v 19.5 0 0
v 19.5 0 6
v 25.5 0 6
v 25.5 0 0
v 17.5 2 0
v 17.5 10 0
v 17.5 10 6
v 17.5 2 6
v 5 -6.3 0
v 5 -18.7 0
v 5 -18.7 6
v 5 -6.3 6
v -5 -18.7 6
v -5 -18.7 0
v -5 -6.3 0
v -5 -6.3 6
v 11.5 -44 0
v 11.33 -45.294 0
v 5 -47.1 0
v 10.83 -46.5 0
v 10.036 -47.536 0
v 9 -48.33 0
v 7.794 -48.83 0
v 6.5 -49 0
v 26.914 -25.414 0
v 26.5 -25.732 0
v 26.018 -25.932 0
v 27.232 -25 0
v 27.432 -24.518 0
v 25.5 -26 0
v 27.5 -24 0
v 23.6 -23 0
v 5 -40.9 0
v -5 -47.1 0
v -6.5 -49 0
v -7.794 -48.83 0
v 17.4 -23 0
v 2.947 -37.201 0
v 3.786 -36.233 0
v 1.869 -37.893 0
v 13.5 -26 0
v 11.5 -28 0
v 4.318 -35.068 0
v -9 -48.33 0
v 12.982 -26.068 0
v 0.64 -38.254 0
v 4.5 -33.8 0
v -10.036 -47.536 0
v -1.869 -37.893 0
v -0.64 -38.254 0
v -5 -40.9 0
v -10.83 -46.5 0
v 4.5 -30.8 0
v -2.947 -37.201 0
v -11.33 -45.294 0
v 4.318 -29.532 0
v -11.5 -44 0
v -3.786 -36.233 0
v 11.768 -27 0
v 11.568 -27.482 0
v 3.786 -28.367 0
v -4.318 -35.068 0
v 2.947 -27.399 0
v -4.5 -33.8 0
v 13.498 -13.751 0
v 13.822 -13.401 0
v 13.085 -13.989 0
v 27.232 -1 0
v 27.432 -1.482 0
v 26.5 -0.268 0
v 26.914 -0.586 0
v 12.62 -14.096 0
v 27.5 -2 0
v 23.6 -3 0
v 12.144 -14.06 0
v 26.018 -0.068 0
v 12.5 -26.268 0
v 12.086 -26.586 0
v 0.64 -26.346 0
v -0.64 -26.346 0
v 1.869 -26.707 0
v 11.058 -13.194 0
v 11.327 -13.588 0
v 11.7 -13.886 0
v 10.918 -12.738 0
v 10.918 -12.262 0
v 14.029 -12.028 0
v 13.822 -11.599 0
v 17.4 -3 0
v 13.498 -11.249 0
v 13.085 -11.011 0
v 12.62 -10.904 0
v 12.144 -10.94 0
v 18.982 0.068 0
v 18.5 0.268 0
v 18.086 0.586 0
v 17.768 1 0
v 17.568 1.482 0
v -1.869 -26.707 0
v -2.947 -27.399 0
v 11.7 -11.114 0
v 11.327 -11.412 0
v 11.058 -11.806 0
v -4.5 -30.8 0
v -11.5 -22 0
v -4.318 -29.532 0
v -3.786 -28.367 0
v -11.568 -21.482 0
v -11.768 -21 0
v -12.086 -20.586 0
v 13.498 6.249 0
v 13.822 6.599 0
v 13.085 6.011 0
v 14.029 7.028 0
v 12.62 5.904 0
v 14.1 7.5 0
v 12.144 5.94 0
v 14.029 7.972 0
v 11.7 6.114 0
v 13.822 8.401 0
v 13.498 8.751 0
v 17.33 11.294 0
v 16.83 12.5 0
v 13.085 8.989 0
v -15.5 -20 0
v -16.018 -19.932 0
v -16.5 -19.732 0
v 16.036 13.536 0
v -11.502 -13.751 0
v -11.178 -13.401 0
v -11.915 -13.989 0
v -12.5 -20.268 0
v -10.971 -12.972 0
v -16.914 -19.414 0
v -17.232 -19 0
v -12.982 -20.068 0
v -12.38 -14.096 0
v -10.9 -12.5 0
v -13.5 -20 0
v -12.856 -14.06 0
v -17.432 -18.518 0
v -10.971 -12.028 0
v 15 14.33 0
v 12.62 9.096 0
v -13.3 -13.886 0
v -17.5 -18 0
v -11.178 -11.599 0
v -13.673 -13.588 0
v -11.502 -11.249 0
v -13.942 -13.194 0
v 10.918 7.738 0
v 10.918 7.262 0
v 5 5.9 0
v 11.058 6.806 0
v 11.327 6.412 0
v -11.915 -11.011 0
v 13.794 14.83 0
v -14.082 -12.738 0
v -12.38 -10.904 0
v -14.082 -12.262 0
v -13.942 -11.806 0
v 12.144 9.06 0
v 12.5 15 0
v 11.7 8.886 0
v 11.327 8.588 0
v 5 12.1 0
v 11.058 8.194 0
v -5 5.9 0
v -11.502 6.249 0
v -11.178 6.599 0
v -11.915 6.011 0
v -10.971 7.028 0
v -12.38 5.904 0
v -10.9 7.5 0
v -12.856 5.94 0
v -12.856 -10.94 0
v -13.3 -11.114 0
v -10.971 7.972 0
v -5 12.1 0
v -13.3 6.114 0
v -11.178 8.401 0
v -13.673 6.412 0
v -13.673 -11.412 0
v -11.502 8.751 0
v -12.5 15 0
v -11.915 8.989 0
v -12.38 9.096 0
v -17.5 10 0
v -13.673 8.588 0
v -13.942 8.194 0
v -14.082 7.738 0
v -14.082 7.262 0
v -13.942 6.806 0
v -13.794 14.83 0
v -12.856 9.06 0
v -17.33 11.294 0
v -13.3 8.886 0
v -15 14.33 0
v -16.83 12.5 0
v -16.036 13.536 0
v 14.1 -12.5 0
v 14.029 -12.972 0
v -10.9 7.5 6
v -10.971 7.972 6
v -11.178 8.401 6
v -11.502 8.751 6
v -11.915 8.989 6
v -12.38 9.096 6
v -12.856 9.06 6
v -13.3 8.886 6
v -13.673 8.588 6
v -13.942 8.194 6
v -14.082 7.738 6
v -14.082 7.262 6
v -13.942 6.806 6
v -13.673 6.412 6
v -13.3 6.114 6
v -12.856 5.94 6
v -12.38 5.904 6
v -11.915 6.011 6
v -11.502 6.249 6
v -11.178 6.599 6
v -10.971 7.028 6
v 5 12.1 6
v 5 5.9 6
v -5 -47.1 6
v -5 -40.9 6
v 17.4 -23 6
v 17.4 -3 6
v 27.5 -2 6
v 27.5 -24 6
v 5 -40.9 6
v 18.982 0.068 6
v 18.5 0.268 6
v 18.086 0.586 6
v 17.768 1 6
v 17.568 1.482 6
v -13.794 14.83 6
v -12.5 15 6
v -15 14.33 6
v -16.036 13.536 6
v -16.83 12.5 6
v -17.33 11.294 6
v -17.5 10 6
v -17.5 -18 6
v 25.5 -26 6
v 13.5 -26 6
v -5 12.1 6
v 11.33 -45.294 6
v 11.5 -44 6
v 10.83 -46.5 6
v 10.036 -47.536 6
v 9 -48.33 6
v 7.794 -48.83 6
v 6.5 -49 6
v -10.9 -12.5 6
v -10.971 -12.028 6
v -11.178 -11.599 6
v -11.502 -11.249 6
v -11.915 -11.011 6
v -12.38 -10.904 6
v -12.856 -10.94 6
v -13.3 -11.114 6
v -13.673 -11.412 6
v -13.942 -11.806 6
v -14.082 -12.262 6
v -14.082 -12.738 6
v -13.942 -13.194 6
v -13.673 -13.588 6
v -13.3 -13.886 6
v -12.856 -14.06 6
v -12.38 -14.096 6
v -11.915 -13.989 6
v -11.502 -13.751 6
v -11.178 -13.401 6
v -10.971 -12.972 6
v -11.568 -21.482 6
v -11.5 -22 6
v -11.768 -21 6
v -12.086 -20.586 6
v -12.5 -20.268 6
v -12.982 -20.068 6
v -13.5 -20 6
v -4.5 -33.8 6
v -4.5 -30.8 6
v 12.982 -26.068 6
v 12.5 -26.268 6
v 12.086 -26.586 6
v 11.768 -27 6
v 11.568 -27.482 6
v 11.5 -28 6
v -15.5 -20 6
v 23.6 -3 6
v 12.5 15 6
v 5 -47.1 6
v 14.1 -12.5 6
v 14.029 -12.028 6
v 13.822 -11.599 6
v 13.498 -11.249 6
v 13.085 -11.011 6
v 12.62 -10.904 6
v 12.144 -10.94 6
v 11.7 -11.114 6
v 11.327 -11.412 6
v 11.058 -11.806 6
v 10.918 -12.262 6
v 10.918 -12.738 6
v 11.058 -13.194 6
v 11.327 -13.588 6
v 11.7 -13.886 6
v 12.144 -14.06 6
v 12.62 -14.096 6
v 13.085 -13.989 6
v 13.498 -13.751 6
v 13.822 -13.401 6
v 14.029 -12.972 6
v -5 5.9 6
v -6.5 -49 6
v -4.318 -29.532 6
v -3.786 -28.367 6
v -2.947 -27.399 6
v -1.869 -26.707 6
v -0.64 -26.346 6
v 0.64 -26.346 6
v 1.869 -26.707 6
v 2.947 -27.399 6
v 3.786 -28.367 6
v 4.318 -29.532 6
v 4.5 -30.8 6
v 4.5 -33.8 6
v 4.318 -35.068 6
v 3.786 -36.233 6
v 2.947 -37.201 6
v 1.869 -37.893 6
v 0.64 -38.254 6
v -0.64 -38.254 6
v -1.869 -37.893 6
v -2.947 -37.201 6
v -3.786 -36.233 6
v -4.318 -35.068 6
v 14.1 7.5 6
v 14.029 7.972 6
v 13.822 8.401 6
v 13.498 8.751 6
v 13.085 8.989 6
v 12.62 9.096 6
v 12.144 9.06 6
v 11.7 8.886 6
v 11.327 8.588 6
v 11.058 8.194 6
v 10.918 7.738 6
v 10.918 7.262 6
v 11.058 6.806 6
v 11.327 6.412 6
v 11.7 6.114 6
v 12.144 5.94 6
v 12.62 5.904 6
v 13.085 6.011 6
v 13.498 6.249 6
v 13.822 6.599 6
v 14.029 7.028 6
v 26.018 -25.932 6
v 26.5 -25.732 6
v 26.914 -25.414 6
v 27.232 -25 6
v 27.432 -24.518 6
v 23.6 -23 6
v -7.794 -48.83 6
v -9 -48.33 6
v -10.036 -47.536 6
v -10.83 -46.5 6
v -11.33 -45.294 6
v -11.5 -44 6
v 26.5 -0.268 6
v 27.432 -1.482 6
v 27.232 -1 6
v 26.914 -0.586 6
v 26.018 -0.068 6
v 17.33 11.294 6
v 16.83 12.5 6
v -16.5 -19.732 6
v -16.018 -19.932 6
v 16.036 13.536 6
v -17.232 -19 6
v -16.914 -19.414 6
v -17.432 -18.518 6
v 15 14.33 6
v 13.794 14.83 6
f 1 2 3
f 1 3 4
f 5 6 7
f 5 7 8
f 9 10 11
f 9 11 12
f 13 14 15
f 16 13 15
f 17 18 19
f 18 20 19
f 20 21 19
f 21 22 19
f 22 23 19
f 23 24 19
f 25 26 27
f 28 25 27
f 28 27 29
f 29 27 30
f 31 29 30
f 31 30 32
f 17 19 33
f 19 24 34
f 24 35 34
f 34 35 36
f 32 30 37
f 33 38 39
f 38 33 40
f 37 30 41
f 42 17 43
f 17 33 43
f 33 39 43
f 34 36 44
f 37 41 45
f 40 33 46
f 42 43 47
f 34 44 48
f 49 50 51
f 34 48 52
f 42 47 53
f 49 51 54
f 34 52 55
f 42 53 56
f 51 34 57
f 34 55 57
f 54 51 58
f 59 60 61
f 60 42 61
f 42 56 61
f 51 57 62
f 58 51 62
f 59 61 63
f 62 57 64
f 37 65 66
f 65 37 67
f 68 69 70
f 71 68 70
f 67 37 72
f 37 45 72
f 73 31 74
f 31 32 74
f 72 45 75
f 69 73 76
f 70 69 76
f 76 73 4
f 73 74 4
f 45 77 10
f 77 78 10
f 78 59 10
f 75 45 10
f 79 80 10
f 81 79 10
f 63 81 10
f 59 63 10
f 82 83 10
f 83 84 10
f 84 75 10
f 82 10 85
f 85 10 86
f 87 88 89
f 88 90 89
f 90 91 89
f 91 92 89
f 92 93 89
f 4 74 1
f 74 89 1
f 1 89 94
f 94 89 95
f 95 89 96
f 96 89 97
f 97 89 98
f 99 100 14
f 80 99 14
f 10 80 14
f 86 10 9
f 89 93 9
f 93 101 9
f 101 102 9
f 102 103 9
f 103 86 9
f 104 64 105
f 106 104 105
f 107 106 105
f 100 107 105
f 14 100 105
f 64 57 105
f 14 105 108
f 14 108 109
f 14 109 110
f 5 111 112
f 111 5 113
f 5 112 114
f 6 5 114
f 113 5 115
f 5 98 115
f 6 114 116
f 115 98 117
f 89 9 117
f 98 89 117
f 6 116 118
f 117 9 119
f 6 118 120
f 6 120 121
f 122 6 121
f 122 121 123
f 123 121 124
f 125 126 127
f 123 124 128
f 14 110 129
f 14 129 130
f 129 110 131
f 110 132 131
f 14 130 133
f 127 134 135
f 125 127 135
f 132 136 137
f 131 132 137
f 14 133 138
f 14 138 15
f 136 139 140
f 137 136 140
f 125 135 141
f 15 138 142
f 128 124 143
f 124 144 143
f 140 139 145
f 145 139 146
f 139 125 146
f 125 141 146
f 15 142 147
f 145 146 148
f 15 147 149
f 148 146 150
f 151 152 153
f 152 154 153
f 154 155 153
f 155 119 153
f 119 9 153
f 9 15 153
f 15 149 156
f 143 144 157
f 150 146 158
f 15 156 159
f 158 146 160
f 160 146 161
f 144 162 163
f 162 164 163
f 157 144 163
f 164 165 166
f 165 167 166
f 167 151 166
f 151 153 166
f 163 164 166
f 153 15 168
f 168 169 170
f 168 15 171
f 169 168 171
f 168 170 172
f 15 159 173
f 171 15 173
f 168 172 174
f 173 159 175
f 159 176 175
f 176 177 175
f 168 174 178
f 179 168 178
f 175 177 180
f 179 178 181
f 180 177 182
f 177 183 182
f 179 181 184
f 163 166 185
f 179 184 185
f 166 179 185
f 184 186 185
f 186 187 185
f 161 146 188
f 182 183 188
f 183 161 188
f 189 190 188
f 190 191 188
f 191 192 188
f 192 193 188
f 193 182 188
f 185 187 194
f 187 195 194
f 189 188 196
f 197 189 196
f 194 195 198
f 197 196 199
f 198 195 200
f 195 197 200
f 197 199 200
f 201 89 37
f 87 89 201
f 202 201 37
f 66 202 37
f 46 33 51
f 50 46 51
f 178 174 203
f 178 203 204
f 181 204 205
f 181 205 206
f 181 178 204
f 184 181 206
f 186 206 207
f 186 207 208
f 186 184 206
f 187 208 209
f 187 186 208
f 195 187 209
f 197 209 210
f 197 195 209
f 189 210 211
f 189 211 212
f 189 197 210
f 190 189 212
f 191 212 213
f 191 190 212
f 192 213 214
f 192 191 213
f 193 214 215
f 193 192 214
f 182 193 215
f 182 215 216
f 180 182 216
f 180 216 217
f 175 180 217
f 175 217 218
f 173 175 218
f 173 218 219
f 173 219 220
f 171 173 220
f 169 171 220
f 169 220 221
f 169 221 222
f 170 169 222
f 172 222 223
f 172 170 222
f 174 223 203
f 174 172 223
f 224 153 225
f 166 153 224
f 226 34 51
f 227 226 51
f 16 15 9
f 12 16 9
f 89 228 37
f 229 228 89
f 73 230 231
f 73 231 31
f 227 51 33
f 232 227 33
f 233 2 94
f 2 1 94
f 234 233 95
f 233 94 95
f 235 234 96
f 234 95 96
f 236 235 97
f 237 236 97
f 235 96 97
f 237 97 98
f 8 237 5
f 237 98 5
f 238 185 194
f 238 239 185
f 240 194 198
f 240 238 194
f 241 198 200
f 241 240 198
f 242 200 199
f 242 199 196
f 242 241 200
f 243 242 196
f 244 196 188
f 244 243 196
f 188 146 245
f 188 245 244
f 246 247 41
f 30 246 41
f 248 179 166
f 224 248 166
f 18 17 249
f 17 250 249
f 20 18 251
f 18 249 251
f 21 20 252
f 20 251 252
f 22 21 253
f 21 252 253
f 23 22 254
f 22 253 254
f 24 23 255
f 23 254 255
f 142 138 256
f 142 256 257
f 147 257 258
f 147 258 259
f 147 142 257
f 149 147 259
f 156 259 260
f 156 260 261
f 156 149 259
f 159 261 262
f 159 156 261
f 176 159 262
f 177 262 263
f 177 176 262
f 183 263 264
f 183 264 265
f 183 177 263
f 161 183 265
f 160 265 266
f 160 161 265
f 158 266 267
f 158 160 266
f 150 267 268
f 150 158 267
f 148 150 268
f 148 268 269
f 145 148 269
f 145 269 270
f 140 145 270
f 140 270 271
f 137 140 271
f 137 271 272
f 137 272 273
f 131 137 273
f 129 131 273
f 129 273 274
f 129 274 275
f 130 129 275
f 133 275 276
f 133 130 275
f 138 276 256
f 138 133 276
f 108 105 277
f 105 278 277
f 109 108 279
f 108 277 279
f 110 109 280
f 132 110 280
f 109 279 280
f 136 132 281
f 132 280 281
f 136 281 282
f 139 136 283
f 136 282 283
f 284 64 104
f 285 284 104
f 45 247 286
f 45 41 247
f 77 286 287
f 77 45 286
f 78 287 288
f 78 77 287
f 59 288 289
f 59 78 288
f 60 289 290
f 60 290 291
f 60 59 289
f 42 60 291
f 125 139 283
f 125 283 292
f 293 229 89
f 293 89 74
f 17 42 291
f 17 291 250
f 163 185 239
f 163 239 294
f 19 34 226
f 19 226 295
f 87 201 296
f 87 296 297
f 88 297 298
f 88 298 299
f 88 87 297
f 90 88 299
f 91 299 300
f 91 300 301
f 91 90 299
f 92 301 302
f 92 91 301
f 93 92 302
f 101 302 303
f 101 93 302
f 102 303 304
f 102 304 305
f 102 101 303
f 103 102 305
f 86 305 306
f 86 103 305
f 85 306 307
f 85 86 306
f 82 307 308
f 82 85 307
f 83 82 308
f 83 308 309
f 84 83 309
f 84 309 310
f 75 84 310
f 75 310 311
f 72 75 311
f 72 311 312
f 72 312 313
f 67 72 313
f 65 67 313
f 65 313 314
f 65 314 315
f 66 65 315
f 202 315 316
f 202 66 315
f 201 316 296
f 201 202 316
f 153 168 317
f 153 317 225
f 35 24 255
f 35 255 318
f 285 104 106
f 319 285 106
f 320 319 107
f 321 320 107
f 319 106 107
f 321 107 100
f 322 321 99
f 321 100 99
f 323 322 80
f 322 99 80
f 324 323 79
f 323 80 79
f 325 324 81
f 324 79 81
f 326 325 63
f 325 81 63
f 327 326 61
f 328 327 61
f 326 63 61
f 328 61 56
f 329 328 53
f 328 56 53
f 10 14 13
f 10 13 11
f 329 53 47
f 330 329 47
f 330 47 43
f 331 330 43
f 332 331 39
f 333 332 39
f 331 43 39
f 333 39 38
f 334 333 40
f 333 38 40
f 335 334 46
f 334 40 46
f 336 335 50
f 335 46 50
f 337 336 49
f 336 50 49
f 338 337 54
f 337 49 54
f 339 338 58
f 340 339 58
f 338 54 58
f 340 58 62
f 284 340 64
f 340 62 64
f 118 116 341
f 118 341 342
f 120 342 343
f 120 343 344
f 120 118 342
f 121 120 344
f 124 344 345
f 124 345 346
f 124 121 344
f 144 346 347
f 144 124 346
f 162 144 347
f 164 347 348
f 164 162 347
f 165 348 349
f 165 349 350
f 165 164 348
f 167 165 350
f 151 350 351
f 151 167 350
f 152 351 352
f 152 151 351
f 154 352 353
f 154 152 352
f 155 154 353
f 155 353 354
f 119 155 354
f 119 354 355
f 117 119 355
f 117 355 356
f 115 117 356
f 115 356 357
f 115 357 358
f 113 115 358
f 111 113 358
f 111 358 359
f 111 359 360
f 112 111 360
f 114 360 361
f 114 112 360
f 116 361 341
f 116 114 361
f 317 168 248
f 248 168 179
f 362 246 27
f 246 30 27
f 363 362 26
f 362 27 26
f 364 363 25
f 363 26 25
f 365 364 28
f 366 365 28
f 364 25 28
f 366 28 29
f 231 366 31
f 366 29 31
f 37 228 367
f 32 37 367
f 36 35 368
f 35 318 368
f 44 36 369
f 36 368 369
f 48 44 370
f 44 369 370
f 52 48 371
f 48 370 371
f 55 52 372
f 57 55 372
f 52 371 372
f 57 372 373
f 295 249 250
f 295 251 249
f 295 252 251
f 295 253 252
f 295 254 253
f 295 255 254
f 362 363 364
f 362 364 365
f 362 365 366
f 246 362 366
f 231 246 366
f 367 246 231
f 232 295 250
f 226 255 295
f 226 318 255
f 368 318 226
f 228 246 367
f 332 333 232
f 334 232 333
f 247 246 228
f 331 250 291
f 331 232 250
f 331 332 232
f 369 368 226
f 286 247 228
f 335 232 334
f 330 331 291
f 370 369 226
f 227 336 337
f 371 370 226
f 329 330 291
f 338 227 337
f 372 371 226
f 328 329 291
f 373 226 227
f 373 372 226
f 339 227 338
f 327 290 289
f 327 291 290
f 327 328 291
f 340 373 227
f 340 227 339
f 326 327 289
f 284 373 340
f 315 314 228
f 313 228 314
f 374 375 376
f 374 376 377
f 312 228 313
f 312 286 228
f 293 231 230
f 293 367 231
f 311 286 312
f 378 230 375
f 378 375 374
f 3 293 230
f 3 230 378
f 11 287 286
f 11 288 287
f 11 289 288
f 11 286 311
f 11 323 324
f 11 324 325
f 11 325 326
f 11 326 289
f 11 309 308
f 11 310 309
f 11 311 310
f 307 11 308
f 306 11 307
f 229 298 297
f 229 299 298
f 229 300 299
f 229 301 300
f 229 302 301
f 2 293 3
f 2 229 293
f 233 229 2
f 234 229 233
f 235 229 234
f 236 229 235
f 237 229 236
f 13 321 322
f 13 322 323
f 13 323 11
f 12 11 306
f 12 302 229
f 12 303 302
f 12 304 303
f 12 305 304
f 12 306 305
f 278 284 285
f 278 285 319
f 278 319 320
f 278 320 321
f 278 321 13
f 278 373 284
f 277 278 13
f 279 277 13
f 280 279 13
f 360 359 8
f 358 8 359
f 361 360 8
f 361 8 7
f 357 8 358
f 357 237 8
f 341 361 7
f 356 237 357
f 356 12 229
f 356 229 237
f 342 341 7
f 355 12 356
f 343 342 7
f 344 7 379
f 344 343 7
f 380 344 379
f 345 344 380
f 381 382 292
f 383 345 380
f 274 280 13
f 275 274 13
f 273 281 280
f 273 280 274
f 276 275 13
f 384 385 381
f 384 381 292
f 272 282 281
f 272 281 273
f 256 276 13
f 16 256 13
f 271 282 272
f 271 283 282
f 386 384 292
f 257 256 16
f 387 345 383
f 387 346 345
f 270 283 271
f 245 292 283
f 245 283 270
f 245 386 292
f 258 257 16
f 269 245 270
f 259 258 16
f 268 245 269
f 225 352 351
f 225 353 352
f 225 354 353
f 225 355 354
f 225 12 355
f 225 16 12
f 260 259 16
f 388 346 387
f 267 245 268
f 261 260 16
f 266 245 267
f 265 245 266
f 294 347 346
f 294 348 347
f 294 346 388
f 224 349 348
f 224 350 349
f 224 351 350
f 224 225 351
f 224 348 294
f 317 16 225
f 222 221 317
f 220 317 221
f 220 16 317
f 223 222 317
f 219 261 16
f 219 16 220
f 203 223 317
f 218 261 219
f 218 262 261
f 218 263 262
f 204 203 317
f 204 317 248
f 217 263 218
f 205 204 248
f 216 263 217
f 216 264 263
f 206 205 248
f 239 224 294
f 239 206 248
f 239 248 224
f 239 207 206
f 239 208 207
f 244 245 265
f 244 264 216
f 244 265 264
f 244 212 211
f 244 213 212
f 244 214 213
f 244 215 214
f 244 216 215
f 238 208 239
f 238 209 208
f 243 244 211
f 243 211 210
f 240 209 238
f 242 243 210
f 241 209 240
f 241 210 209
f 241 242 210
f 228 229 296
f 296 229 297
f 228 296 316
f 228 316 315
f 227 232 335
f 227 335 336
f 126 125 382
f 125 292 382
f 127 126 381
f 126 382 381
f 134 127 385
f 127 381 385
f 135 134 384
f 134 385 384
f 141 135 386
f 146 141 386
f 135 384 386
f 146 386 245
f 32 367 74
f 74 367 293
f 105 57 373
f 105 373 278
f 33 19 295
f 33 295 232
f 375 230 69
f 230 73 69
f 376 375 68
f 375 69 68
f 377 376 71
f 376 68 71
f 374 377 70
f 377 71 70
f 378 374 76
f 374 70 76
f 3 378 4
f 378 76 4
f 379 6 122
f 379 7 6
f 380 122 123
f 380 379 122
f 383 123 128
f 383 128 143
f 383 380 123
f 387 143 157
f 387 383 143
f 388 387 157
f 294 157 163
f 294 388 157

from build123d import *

# Parameters (mm, degrees)
SKETCH1_R           = 1.6
SKETCH1_W           = 10
SKETCH1_H           = 12.4
SKETCH1_H_2         = 6.2
BOSS_EXTRUDE1_DEPTH = 6
SKETCH4_W           = 6
SKETCH4_H           = 20
BOSS_EXTRUDE2_DEPTH = 10
SKETCH7_W           = 6
SKETCH7_H           = 6
BOSS_EXTRUDE3_DEPTH = 16
CUT_EXTRUDE1_REACH  = 58.509
SKETCH6_W           = 6.2
SKETCH6_H           = 20
FILLET1_R           = 2
FILLET2_R           = 5


with BuildPart() as part:
    # Sketch1 → Boss-Extrude1 (new body)
    with BuildSketch(Plane.XY):
        Polygon((17.5, -20), (11.5, -20), (11.5, -49), (-11.5, -49), (-11.5, -20), (-17.5, -20), (-17.5, 15), (17.5, 15), align=None)
        with Locations((12.5, 7.5)):
            Circle(SKETCH1_R, mode=Mode.SUBTRACT)
        with Locations((-12.5, 7.5)):
            Circle(SKETCH1_R, mode=Mode.SUBTRACT)
        with Locations((-12.5, -12.5)):
            Circle(SKETCH1_R, mode=Mode.SUBTRACT)
        with Locations((12.5, -12.5)):
            Circle(SKETCH1_R, mode=Mode.SUBTRACT)
        with Locations((0, -12.5)):
            Rectangle(SKETCH1_W, SKETCH1_H, mode=Mode.SUBTRACT)
        with Locations((0, 9)):
            Rectangle(SKETCH1_W, SKETCH1_H_2, mode=Mode.SUBTRACT)
        with BuildLine():
            Line((-4.5, -33.8), (-4.5, -30.8))
            ThreePointArc((-4.5, -30.8), (0, -26.3), (4.5, -30.8))
            Line((4.5, -30.8), (4.5, -33.8))
            ThreePointArc((4.5, -33.8), (0, -38.3), (-4.5, -33.8))
        make_face(mode=Mode.SUBTRACT)
        with Locations((0, -44)):
            Rectangle(SKETCH1_W, SKETCH1_H_2, mode=Mode.SUBTRACT)
    extrude(amount=BOSS_EXTRUDE1_DEPTH)

    # Sketch4 → Boss-Extrude2 (add)
    with BuildSketch(Plane(origin=(17.5, 0, 0), x_dir=(0, 0, -1), z_dir=(1, 0, 0))):
        with Locations((-3, -10)):
            Rectangle(SKETCH4_W, SKETCH4_H)
    extrude(amount=BOSS_EXTRUDE2_DEPTH)

    # Sketch7 → Boss-Extrude3 (add)
    with BuildSketch(Plane(origin=(11.5, 0, 0), x_dir=(0, 0, -1), z_dir=(1, 0, 0))):
        with Locations((-3, -23)):
            Rectangle(SKETCH7_W, SKETCH7_H)
    extrude(amount=BOSS_EXTRUDE3_DEPTH)

    # Sketch6 → Cut-Extrude1 (cut, up to next)
    with BuildSketch(Plane.XY.offset(6), mode=Mode.PRIVATE) as cut_extrude1_sk1:
        with Locations((20.5, -13)):
            Rectangle(SKETCH6_W, SKETCH6_H)
    cut_extrude1_tool1 = extrude(cut_extrude1_sk1.sketch, amount=-CUT_EXTRUDE1_REACH, mode=Mode.PRIVATE) & part.part
    add(cut_extrude1_tool1.solids().sort_by_distance((20.5, -13, 6))[0], mode=Mode.SUBTRACT)

    # Fillet1
    fillet1_edges = [part.edges().sort_by_distance(p)[0] for p in [
        (27.5, 0, 3),
        (11.5, -26, 3),
        (27.5, -26, 3),
        (-11.5, -20, 3),
        (-17.5, -20, 3),
        (17.5, 0, 3),
    ]]
    fillet(fillet1_edges, radius=FILLET1_R)

    # Fillet2
    fillet2_edges = [part.edges().sort_by_distance(p)[0] for p in [
        (-17.5, 15, 3),
        (17.5, 15, 3),
        (11.5, -49, 3),
        (-11.5, -49, 3),
    ]]
    fillet(fillet2_edges, radius=FILLET2_R)


solid = part.part
